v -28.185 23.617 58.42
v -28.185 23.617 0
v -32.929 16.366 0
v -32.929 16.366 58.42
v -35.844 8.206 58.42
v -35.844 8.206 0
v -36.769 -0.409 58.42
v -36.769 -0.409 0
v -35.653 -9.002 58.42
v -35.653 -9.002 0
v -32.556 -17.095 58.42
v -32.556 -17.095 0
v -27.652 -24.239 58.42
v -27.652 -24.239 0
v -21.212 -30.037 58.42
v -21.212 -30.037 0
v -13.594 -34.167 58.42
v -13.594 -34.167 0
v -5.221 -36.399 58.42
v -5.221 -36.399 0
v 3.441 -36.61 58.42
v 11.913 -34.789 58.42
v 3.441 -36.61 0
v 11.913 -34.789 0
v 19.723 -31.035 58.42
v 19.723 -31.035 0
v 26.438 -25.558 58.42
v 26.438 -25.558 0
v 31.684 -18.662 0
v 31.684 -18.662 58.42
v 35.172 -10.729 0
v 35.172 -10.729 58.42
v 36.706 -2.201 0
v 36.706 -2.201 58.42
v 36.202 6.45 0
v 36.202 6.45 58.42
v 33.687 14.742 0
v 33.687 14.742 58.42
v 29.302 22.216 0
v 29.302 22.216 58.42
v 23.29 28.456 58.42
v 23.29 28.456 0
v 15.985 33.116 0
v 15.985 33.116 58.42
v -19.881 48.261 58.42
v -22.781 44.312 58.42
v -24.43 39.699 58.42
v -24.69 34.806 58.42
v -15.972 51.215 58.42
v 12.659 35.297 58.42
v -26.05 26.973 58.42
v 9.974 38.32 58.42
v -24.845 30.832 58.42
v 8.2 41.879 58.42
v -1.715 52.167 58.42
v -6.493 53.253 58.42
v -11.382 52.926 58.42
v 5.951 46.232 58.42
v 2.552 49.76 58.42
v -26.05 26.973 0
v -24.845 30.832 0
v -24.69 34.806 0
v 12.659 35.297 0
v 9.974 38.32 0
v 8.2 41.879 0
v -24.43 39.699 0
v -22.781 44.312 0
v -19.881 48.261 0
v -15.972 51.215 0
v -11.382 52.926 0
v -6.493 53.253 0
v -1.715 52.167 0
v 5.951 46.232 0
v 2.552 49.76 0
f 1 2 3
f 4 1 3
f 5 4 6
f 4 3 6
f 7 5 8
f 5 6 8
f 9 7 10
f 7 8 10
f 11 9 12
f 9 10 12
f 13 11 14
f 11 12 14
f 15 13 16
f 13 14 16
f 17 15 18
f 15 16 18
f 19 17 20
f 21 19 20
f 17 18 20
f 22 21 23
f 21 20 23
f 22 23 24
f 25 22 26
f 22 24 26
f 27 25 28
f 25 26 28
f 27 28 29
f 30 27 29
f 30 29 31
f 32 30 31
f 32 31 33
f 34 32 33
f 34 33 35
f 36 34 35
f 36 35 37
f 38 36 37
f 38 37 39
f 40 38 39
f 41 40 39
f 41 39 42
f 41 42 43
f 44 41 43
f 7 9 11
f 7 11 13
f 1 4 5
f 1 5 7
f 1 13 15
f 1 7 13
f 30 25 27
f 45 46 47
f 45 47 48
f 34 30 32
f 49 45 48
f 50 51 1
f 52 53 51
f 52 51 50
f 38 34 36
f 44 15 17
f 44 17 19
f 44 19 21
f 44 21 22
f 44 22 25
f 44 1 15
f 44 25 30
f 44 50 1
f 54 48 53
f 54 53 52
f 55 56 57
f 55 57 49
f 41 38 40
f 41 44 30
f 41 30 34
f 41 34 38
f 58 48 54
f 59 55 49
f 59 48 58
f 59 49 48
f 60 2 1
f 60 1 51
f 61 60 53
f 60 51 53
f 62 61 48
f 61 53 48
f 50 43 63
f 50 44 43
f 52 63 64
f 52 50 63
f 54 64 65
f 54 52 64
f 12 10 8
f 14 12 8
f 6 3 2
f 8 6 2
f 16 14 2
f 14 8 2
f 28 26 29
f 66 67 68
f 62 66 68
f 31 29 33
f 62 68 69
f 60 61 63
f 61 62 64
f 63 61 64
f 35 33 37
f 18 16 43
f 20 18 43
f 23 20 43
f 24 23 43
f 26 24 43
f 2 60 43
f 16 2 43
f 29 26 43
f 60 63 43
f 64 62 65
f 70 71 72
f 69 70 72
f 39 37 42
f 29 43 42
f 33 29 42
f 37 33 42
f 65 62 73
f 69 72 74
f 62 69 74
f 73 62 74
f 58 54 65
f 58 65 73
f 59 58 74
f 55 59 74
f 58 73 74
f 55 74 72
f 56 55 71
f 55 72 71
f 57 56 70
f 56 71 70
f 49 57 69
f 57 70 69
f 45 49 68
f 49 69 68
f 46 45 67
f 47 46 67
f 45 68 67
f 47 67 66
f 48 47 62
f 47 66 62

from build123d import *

# Parameters (mm, degrees)
F1_DEPTH = 58.42
F2_R     = 15.24
F3_R     = 6.8301694269
F4_DEPTH = 30.48


with BuildPart() as f1:
    # F0 (on Top) → F1 (new body)
    with BuildSketch(Plane.XY):
        with BuildLine():
            ThreePointArc((-22.9468365368, 28.7332625584), (-15.943079518, -33.1357193942), (36.7716967829, 0))
            ThreePointArc((36.7716967829, 0), (29.0432904816, 22.553158588), (9.1066714076, 35.6262013154))
            ThreePointArc((9.1066714076, 35.6262013154), (-7.7308275028, 35.9498538302), (-22.9468365368, 28.7332625584))
        make_face()
        with BuildLine():
            ThreePointArc((-22.9468365368, 28.7332625584), (-7.7308275028, 35.9498538302), (9.1066714076, 35.6262013154))
            ThreePointArc((9.1066714076, 35.6262013154), (-11.3815660909, 52.926499418), (-22.9468365368, 28.7332625584))
        make_face()
    extrude(amount=F1_DEPTH)

    # F2
    f2_edges = [f1.edges().sort_by_distance(p)[0] for p in [
        (9.106671, 35.626201, 29.21),
        (-22.946837, 28.733263, 29.21),
    ]]
    fillet(f2_edges, radius=F2_R)

    # F3 (on face) → F4 (join)
    with BuildSketch(Plane.XY.offset(58.42)):
        with Locations((-1.7507391749, 3.4323732834)):
            Circle(F3_R)
    extrude(amount=-F4_DEPTH)


solid = f1.part
